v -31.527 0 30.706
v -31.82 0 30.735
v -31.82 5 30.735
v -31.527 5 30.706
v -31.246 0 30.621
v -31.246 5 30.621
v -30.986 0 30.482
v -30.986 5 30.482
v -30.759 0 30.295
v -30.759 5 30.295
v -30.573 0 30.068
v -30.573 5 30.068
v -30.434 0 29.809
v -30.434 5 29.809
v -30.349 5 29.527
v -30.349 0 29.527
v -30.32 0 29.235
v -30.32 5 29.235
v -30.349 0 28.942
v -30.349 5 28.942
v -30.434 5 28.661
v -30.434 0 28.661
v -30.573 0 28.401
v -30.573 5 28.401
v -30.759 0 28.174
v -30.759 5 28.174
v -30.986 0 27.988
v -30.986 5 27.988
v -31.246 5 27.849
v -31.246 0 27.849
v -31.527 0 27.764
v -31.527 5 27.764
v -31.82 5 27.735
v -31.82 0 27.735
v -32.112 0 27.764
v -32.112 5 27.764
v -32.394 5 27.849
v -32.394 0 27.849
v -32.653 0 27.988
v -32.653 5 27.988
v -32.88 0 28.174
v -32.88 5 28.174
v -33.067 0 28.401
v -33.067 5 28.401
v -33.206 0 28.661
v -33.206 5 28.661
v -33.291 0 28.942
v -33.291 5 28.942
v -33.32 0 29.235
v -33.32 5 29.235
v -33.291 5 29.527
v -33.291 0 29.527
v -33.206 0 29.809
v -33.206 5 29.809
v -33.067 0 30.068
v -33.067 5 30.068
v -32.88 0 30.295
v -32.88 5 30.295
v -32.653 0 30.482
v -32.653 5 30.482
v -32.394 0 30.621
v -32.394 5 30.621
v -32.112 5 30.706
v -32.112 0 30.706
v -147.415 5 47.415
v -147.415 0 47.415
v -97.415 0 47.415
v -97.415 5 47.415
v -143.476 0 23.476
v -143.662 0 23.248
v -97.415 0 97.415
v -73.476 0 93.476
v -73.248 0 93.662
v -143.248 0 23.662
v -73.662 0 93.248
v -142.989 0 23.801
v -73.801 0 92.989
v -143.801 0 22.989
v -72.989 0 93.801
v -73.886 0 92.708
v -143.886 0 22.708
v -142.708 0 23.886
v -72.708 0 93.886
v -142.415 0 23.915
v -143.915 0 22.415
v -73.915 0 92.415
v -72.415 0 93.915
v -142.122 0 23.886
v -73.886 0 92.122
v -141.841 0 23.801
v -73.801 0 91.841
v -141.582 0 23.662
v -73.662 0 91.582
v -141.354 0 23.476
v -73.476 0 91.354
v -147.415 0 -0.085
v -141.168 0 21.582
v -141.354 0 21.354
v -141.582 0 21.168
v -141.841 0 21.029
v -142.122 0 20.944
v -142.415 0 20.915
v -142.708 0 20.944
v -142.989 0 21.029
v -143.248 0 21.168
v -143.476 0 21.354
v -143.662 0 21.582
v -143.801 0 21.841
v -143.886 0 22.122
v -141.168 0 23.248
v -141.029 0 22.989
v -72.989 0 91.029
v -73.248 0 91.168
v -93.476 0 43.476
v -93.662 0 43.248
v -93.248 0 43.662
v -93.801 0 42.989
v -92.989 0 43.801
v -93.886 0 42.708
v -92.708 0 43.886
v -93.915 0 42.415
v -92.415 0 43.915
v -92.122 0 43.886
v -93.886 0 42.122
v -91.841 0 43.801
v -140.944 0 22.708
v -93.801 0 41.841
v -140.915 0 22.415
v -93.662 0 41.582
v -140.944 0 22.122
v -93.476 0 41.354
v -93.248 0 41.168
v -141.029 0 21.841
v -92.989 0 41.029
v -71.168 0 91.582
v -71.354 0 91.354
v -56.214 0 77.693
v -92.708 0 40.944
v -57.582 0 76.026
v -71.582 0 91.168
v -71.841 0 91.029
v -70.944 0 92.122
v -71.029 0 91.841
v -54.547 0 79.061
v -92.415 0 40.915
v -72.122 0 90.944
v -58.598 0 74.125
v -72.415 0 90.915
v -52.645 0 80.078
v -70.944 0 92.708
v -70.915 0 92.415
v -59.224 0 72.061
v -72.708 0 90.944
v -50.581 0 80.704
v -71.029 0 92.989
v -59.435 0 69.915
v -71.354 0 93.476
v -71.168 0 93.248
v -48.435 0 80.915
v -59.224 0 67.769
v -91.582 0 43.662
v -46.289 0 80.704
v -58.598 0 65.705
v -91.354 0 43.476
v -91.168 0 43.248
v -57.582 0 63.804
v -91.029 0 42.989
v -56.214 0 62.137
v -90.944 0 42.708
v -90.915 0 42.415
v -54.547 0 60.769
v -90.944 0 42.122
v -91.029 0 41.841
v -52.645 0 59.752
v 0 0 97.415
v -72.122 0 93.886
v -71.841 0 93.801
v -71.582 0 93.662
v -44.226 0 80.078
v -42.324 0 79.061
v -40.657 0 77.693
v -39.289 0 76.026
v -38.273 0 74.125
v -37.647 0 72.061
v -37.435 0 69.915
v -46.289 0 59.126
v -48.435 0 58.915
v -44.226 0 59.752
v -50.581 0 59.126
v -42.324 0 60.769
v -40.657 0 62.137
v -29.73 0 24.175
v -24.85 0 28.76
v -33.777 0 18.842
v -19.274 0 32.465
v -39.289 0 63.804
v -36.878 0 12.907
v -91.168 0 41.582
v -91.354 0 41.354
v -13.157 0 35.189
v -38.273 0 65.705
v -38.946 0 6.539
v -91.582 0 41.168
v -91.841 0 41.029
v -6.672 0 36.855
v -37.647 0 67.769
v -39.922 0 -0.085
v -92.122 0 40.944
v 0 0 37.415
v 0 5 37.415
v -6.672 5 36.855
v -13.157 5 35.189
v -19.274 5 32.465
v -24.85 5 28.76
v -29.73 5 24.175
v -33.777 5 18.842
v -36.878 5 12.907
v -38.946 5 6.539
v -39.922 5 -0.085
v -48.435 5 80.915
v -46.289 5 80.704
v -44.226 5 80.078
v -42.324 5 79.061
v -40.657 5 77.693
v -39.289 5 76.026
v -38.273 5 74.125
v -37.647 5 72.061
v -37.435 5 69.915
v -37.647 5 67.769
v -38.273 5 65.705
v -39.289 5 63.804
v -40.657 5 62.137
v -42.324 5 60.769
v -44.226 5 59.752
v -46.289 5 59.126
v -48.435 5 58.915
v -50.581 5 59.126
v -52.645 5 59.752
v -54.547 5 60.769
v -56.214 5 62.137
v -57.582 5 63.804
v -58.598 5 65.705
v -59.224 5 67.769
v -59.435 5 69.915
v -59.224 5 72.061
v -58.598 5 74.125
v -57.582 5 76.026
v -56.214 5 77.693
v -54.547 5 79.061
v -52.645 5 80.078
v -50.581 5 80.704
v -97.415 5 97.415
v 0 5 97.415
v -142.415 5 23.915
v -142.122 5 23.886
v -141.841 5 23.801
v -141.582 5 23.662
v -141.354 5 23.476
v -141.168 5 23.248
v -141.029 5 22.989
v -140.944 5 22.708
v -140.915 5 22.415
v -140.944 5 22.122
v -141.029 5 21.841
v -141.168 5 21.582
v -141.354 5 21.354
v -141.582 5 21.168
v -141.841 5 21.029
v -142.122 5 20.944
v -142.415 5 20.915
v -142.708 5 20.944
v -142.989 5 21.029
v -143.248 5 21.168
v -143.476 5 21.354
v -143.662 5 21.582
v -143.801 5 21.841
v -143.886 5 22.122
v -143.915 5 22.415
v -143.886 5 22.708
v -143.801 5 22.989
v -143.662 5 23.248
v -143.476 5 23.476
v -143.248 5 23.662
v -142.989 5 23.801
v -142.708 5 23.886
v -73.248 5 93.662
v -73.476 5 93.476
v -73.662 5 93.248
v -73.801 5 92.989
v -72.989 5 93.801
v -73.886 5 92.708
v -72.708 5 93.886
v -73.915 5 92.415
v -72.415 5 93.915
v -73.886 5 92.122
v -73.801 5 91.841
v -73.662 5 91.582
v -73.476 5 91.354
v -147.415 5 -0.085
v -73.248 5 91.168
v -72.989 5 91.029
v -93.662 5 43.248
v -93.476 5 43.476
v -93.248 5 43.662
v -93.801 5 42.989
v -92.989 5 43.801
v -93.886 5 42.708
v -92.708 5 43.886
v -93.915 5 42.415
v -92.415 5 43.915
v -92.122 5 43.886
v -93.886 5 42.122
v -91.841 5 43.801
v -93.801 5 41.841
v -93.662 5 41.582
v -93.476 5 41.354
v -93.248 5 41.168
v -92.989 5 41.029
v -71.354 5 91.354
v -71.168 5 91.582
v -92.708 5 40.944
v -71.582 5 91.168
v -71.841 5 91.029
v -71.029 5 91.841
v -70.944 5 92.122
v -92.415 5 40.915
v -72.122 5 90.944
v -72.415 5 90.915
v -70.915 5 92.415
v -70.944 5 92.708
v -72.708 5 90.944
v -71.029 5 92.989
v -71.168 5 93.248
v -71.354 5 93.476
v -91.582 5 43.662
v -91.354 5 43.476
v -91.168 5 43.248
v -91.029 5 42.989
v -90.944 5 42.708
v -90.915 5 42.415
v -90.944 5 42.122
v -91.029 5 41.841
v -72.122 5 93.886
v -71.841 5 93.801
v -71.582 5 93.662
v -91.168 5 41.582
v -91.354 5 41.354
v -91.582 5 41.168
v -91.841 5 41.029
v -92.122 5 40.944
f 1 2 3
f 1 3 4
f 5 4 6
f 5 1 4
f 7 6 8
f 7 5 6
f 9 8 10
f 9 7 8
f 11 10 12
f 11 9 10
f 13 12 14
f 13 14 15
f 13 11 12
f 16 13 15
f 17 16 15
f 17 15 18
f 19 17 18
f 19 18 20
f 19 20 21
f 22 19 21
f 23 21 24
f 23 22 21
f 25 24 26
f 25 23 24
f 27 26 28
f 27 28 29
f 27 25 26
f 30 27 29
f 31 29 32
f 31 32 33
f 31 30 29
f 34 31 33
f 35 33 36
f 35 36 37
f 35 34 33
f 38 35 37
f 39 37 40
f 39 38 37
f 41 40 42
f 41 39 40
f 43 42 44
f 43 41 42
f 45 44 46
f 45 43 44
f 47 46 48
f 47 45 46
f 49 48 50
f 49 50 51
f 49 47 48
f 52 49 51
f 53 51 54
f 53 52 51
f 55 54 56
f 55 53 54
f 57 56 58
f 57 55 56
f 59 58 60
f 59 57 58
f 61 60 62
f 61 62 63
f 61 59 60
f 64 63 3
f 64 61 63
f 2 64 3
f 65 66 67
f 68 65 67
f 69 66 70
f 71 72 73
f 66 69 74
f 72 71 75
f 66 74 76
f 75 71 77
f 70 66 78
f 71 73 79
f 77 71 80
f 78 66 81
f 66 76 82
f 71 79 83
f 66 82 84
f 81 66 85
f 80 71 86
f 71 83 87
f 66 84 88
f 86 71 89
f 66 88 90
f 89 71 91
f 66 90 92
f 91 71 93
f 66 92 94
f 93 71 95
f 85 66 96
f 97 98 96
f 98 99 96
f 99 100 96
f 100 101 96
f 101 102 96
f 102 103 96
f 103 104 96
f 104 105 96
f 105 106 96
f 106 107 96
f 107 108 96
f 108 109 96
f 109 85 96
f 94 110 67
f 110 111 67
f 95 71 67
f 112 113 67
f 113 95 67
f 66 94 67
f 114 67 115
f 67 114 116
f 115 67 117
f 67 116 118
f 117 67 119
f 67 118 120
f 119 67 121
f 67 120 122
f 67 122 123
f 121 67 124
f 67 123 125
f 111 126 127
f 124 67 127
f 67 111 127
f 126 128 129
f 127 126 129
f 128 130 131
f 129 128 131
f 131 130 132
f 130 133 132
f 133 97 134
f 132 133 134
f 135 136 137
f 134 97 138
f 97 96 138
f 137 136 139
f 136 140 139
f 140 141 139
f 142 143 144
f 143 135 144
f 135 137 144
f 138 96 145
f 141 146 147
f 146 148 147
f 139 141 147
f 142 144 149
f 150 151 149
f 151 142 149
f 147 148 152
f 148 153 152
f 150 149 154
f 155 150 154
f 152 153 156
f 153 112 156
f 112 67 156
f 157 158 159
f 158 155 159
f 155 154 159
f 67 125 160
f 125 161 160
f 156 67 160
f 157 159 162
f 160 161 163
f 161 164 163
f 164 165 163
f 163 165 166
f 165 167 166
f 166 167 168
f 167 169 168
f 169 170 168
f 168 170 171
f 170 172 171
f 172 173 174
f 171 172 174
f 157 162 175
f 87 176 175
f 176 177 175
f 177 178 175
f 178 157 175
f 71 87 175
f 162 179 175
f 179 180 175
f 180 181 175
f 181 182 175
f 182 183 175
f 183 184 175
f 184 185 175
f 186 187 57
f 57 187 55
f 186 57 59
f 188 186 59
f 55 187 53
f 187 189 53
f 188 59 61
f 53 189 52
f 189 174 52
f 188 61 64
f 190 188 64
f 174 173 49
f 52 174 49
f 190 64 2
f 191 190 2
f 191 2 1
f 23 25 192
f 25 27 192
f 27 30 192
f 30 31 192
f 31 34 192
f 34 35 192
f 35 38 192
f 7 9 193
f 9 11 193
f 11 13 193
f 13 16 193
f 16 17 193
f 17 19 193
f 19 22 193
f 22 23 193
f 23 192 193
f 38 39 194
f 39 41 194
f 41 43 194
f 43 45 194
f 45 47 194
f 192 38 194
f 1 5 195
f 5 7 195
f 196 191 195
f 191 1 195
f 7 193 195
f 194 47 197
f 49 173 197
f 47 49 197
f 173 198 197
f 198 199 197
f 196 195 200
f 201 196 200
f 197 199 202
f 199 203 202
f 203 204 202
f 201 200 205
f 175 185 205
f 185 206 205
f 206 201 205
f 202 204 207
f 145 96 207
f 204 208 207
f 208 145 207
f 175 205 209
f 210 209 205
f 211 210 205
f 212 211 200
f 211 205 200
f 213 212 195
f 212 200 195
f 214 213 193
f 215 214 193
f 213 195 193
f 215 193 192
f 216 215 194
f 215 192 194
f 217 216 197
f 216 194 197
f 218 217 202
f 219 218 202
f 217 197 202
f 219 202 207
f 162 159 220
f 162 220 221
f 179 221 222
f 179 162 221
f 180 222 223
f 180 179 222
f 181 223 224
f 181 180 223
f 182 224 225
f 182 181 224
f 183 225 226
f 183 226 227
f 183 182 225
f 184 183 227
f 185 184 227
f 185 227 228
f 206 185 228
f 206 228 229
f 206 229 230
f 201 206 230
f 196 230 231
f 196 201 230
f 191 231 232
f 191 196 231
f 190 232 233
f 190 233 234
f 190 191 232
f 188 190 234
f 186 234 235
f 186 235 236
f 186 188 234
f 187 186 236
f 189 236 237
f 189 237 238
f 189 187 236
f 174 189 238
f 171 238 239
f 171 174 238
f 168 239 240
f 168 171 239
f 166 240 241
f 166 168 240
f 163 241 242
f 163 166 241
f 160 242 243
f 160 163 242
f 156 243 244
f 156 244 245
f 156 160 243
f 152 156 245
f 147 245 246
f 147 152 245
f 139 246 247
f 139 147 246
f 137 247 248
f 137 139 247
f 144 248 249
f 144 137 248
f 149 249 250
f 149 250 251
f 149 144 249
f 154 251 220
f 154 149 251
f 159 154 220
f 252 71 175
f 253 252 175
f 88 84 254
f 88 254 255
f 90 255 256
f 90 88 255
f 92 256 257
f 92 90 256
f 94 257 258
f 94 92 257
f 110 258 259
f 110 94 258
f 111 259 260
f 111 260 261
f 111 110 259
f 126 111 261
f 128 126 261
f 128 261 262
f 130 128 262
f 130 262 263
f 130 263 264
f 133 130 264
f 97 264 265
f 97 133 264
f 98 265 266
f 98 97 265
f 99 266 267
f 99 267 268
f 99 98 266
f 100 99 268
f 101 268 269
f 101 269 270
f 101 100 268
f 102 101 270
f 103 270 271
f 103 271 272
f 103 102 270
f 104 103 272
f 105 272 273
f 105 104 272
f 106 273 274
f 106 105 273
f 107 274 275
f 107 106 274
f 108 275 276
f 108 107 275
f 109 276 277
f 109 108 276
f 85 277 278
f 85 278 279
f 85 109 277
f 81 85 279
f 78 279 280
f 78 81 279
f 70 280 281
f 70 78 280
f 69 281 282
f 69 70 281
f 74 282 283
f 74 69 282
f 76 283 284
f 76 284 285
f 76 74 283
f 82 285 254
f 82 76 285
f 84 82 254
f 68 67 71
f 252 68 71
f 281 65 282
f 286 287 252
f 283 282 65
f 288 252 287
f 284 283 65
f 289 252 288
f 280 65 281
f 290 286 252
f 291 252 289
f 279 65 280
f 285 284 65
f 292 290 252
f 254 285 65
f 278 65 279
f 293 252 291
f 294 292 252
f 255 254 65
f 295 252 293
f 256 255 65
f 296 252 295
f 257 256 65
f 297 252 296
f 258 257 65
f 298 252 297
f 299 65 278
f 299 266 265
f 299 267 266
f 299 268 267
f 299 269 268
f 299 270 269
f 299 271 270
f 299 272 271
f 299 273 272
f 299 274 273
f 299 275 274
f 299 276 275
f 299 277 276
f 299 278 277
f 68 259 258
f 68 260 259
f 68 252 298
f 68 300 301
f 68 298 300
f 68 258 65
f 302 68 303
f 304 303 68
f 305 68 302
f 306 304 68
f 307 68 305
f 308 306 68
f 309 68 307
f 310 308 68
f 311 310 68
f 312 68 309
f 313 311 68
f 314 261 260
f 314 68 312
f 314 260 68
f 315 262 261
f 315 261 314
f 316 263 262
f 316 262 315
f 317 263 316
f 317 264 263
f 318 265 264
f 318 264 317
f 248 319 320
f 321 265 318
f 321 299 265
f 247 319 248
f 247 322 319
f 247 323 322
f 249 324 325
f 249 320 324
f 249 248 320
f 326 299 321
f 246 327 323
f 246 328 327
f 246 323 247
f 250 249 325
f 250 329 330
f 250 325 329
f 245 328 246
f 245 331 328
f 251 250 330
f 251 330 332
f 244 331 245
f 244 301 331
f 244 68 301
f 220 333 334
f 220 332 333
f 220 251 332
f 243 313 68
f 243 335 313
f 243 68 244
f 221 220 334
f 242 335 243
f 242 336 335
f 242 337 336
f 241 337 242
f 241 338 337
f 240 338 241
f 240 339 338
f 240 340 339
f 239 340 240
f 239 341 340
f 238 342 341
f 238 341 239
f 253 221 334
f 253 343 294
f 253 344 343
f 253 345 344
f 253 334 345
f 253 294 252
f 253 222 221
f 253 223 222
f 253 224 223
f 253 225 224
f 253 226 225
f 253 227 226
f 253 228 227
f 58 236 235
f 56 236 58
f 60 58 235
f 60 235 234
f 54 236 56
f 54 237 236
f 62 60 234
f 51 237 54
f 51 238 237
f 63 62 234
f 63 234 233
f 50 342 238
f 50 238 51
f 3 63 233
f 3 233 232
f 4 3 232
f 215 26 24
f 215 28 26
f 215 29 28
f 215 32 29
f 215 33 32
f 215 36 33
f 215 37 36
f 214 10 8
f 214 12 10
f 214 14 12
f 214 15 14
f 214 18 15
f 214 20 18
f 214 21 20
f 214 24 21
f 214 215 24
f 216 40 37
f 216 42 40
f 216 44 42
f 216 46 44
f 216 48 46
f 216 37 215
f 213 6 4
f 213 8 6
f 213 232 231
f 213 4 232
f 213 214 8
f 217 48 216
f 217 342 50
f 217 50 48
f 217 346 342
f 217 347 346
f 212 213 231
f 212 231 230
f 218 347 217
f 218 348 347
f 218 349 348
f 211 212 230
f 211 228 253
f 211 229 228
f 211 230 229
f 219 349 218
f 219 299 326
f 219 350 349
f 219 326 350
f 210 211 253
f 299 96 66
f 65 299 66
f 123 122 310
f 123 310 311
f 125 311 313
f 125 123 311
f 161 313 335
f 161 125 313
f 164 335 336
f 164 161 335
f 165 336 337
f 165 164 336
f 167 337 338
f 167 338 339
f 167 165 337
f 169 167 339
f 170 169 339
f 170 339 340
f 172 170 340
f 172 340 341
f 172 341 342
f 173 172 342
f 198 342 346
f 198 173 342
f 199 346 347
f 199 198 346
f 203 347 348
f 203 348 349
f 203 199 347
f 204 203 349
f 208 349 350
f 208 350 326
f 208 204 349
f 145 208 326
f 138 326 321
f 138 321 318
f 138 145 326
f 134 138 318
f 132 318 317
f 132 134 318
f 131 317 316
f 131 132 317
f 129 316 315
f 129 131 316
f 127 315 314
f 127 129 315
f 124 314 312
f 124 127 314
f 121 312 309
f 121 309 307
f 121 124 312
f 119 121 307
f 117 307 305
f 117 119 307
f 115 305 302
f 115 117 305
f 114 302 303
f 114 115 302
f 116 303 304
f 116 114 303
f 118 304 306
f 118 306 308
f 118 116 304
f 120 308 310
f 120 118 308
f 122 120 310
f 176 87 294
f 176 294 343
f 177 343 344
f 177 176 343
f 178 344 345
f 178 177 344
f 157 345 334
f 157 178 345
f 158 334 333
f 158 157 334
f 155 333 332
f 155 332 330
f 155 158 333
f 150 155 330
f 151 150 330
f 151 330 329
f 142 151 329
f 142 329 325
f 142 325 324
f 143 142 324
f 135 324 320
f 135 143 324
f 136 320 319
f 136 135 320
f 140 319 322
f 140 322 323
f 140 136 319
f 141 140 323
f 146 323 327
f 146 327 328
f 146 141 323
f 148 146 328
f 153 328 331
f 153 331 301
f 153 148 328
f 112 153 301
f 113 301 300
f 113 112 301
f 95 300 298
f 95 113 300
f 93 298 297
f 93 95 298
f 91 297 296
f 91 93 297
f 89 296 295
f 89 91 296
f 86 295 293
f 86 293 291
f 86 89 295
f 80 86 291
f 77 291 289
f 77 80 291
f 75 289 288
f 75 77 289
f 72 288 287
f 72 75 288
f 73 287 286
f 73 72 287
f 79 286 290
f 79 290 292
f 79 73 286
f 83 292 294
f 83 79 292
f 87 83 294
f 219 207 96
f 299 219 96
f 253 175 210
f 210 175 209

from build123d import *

# Parameters (mm, degrees)
ESQUISSE1_R        = 1.5
ESQUISSE1_R_2      = 11
BOSS_EXTRU_1_DEPTH = 5


with BuildPart() as part:
    # Esquisse1 → Boss.-Extru.1 (new body)
    with BuildSketch(Plane(origin=(0, 0, 0), x_dir=(1, 0, 0), z_dir=(0, 1, 0))):
        with BuildLine():
            Line((-97.415, -97.415), (0, -97.415))
            Line((0, -97.415), (0, -37.415))
            ThreePointArc((0, -37.415), (-27.386127875, -26.569759474), (-39.921798557, 0.085))
            Line((-39.921798557, 0.085), (-147.415, 0.085))
            Line((-147.415, 0.085), (-147.415, -47.415))
            Line((-147.415, -47.415), (-97.415, -47.415))
            Line((-97.415, -47.415), (-97.415, -97.415))
        make_face()
        with Locations(Location((-72.415, -92.415, 0), (0, 0, 270))):
            Circle(ESQUISSE1_R, mode=Mode.SUBTRACT)
        with Locations(Location((-48.43544943, -69.915, 0), (0, 0, 270))):
            Circle(ESQUISSE1_R_2, mode=Mode.SUBTRACT)
        with Locations(Location((-142.415, -22.415, 0), (0, 0, 270))):
            Circle(ESQUISSE1_R, mode=Mode.SUBTRACT)
        with Locations(Location((-92.415, -42.415, 0), (0, 0, 270))):
            Circle(ESQUISSE1_R, mode=Mode.SUBTRACT)
        with Locations(Location((-31.819805153, -29.234805153, 0), (0, 0, 270))):
            Circle(ESQUISSE1_R, mode=Mode.SUBTRACT)
    extrude(amount=BOSS_EXTRU_1_DEPTH)


solid = part.part
